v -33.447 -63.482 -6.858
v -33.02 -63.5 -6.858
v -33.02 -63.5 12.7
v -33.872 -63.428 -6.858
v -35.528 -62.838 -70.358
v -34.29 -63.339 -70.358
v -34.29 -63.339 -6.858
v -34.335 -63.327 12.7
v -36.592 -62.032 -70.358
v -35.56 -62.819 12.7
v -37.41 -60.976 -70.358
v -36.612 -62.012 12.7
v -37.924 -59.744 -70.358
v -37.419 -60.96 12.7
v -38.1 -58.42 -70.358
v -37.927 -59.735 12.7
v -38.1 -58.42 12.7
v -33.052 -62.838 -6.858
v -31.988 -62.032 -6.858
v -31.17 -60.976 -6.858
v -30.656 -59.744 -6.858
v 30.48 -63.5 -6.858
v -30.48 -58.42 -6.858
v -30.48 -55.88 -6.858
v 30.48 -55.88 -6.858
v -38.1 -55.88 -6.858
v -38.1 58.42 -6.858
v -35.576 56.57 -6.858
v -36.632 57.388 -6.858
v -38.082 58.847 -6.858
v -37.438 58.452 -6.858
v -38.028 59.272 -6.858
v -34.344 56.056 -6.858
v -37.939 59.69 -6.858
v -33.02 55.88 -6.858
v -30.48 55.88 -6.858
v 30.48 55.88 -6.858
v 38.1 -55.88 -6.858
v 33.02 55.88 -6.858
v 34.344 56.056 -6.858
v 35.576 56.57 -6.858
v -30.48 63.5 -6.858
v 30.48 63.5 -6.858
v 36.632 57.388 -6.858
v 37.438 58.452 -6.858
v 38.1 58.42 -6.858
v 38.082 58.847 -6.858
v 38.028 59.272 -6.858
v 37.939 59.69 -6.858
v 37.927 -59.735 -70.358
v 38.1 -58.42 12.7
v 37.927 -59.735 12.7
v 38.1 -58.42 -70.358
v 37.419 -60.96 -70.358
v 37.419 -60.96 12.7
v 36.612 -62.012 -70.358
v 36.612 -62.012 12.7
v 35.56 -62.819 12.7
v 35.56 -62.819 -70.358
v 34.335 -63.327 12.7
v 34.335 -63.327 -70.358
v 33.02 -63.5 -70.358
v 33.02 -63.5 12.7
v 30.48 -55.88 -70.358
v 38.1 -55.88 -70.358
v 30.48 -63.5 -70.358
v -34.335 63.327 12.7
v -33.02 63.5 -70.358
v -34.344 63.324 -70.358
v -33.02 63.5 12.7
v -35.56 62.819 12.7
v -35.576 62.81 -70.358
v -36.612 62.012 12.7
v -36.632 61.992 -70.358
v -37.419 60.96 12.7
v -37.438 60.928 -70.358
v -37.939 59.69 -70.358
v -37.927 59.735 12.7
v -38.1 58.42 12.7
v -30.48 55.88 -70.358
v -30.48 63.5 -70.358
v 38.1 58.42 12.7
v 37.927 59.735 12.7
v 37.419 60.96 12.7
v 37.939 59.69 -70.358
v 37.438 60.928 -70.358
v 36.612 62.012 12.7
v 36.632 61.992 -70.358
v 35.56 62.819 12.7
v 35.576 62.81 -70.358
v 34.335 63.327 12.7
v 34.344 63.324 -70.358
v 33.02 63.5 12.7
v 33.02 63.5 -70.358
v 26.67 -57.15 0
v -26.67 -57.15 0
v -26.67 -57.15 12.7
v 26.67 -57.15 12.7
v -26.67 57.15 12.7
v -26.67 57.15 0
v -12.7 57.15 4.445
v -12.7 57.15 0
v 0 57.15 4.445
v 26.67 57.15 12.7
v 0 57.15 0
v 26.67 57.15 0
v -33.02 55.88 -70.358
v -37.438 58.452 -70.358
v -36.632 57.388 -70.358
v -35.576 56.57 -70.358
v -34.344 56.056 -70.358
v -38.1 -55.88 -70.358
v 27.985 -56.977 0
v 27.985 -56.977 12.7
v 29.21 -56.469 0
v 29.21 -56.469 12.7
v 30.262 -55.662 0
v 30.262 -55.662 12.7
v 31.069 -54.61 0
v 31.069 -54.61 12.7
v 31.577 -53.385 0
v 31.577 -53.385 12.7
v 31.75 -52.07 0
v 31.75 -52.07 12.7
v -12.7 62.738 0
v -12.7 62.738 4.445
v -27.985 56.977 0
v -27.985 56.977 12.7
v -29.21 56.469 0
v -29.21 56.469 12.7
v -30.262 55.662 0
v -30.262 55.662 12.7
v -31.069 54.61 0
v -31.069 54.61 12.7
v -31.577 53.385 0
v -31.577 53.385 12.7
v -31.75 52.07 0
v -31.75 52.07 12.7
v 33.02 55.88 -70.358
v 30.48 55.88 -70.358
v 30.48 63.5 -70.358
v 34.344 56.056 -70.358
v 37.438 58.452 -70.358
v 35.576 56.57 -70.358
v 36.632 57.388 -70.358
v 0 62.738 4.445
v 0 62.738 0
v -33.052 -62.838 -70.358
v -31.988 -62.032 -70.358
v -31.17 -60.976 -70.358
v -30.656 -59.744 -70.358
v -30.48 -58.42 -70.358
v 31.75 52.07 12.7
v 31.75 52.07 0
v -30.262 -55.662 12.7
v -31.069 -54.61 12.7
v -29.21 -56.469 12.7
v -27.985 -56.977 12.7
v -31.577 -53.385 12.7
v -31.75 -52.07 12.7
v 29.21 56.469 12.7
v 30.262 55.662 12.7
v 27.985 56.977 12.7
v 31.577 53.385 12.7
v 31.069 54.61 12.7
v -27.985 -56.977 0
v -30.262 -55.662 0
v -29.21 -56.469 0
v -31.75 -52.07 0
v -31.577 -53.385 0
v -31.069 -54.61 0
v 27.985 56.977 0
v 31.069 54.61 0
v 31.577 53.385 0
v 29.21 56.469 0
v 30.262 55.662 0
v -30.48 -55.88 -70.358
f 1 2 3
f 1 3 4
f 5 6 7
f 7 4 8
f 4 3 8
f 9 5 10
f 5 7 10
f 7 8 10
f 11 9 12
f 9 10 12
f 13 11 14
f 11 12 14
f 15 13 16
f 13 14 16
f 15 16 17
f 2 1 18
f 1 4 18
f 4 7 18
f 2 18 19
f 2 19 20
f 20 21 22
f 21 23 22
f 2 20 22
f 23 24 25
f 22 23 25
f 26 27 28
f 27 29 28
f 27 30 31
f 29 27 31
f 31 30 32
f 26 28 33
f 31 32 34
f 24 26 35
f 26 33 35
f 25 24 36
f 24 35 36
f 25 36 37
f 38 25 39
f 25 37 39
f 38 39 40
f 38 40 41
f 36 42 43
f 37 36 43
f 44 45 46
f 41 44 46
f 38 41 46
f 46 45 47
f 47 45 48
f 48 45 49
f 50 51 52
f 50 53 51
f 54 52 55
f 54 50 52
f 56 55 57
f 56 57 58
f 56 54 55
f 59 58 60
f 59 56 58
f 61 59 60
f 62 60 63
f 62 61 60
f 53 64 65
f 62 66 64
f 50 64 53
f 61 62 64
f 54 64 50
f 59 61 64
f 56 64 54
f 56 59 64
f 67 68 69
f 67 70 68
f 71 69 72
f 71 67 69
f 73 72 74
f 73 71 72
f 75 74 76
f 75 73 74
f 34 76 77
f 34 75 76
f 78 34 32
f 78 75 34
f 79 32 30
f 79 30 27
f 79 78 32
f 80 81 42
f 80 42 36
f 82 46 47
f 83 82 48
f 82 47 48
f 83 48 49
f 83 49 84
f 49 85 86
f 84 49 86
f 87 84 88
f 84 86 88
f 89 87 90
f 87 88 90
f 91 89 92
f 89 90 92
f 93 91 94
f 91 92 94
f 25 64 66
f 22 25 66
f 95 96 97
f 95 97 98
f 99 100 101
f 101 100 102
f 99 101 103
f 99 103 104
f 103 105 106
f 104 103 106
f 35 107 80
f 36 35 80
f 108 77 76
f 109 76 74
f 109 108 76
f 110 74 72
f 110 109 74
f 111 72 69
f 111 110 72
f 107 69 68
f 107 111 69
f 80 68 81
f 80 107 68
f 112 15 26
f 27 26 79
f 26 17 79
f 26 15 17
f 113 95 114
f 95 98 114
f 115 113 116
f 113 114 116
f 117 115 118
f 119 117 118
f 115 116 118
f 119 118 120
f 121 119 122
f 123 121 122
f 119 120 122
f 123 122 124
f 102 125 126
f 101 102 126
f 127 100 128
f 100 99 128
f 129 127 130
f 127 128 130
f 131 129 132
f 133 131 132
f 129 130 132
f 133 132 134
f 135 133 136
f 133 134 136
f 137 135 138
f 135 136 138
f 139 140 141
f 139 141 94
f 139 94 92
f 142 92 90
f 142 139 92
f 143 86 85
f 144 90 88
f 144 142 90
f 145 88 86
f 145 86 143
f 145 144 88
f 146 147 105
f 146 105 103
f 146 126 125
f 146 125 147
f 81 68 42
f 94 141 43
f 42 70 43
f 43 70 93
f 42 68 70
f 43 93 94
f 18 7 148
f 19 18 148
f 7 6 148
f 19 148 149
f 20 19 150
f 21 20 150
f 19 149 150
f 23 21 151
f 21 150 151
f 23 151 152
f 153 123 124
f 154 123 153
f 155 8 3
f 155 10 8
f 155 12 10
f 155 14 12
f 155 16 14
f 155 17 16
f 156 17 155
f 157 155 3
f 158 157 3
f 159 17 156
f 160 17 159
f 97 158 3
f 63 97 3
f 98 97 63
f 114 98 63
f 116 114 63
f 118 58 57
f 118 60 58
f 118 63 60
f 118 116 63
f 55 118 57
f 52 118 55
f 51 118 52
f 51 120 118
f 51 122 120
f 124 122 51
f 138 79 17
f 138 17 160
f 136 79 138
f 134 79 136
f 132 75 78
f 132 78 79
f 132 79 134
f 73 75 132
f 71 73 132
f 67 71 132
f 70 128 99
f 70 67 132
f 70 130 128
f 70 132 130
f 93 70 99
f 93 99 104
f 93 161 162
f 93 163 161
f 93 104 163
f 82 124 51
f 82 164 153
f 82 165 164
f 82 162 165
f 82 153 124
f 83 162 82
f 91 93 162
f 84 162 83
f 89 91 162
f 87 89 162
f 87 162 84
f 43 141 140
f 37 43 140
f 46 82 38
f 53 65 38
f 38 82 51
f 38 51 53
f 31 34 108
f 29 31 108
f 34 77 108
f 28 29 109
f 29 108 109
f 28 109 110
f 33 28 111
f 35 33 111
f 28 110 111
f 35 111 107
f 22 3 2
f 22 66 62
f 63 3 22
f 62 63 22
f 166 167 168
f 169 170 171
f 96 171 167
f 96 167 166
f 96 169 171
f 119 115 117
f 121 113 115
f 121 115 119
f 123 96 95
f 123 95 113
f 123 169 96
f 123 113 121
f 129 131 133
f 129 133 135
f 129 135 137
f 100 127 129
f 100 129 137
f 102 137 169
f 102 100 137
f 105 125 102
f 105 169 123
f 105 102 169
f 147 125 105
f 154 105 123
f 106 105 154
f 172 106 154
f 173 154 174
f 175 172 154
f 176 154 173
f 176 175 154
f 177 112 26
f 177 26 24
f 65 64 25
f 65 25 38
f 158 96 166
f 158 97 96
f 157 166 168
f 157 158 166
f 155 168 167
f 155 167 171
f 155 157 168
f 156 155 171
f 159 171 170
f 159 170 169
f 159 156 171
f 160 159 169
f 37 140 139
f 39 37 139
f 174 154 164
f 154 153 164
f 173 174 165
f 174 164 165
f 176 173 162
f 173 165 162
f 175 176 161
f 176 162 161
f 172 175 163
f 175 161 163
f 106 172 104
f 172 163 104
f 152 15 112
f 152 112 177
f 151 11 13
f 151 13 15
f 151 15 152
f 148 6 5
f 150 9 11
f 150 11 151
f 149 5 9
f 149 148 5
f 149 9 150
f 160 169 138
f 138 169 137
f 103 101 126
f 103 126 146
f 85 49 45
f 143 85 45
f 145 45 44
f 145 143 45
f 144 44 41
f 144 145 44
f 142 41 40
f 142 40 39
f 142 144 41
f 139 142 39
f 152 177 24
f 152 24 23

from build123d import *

# Parameters (mm, degrees)
F0_W     = 76.2
F0_H     = 127
F0_W_2   = 63.5
F0_H_2   = 114.3
F1_DEPTH = 12.7
F2_W     = 76.2
F2_H     = 127
F3_DEPTH = 6.858
F4_W     = 7.62
F4_H     = 7.62
F5_DEPTH = 63.5
F6_F1_R  = 5.08
F6_F2_R  = 5.08
F6_F3_R  = 5.08
F6_F4_R  = 5.08
F6_F5_R  = 5.08
F6_F6_R  = 5.08
F6_F7_R  = 5.08
F7_R     = 5.08
F8_W     = 12.7
F8_H     = 4.4445483945
F9_DEPTH = 5.588


with BuildPart() as f1:
    # F0 (on Top) → F1 (new body)
    with BuildSketch(Plane.XY):
        Rectangle(F0_W, F0_H)
        Rectangle(F0_W_2, F0_H_2, mode=Mode.SUBTRACT)
    extrude(amount=F1_DEPTH)

    # F2 (on Top) → F3 (join)
    with BuildSketch(Plane.XY):
        Rectangle(F2_W, F2_H)
    extrude(amount=-F3_DEPTH)

    # F4 (on face) → F5 (join)
    with BuildSketch(Plane(origin=(0, 0, -6.858), x_dir=(1, 0, 0), z_dir=(0, 0, -1))):
        with Locations((34.29, -59.69)):
            Rectangle(F4_W, F4_H)
        with Locations((34.29, 59.69)):
            Rectangle(F4_W, F4_H)
        with Locations((-34.29, 59.69)):
            Rectangle(F4_W, F4_H)
        with Locations((-34.29, -59.69)):
            Rectangle(F4_W, F4_H)
    extrude(amount=F5_DEPTH)

    # F6: fillet of radius 5.08 on 7 edges, made by hand

    # F6_f1
    f6_f1_edges = [f1.edges().sort_by_distance(p)[0] for p in [
        (38.1, 55.88, -38.608),
    ]]
    fillet(f6_f1_edges, radius=F6_F1_R)

    # F6_f2
    f6_f2_edges = [f1.edges().sort_by_distance(p)[0] for p in [
        (-38.1, 55.88, -38.608),
    ]]
    fillet(f6_f2_edges, radius=F6_F2_R)

    # F6_f3
    f6_f3_edges = [f1.edges().sort_by_distance(p)[0] for p in [
        (-30.48, -63.5, -38.608),
    ]]
    fillet(f6_f3_edges, radius=F6_F3_R)

    # F6_f4
    f6_f4_edges = [f1.edges().sort_by_distance(p)[0] for p in [
        (38.1, -63.5, -28.829),
    ]]
    fillet(f6_f4_edges, radius=F6_F4_R)

    # F6_f5
    f6_f5_edges = [f1.edges().sort_by_distance(p)[0] for p in [
        (-38.1, -63.5, -28.829),
    ]]
    fillet(f6_f5_edges, radius=F6_F5_R)

    # F6_f6
    f6_f6_edges = [f1.edges().sort_by_distance(p)[0] for p in [
        (38.1, 63.5, -28.829),
    ]]
    fillet(f6_f6_edges, radius=F6_F6_R)

    # F6_f7
    f6_f7_edges = [f1.edges().sort_by_distance(p)[0] for p in [
        (-38.1, 63.5, -28.829),
    ]]
    fillet(f6_f7_edges, radius=F6_F7_R)

    # F7
    f7_edges = [f1.edges().sort_by_distance(p)[0] for p in [
        (-31.75, -57.15, 6.35),
        (31.75, -57.15, 6.35),
        (-31.75, 57.15, 6.35),
        (31.75, 57.15, 6.35),
    ]]
    fillet(f7_edges, radius=F7_R)

    # F8 (on face) → F9 (cut)
    with BuildSketch(Plane.XZ.offset(-57.15)):
        with Locations((-6.35, 2.2222741973)):
            Rectangle(F8_W, F8_H)
    extrude(amount=-F9_DEPTH, mode=Mode.SUBTRACT)


solid = f1.part
